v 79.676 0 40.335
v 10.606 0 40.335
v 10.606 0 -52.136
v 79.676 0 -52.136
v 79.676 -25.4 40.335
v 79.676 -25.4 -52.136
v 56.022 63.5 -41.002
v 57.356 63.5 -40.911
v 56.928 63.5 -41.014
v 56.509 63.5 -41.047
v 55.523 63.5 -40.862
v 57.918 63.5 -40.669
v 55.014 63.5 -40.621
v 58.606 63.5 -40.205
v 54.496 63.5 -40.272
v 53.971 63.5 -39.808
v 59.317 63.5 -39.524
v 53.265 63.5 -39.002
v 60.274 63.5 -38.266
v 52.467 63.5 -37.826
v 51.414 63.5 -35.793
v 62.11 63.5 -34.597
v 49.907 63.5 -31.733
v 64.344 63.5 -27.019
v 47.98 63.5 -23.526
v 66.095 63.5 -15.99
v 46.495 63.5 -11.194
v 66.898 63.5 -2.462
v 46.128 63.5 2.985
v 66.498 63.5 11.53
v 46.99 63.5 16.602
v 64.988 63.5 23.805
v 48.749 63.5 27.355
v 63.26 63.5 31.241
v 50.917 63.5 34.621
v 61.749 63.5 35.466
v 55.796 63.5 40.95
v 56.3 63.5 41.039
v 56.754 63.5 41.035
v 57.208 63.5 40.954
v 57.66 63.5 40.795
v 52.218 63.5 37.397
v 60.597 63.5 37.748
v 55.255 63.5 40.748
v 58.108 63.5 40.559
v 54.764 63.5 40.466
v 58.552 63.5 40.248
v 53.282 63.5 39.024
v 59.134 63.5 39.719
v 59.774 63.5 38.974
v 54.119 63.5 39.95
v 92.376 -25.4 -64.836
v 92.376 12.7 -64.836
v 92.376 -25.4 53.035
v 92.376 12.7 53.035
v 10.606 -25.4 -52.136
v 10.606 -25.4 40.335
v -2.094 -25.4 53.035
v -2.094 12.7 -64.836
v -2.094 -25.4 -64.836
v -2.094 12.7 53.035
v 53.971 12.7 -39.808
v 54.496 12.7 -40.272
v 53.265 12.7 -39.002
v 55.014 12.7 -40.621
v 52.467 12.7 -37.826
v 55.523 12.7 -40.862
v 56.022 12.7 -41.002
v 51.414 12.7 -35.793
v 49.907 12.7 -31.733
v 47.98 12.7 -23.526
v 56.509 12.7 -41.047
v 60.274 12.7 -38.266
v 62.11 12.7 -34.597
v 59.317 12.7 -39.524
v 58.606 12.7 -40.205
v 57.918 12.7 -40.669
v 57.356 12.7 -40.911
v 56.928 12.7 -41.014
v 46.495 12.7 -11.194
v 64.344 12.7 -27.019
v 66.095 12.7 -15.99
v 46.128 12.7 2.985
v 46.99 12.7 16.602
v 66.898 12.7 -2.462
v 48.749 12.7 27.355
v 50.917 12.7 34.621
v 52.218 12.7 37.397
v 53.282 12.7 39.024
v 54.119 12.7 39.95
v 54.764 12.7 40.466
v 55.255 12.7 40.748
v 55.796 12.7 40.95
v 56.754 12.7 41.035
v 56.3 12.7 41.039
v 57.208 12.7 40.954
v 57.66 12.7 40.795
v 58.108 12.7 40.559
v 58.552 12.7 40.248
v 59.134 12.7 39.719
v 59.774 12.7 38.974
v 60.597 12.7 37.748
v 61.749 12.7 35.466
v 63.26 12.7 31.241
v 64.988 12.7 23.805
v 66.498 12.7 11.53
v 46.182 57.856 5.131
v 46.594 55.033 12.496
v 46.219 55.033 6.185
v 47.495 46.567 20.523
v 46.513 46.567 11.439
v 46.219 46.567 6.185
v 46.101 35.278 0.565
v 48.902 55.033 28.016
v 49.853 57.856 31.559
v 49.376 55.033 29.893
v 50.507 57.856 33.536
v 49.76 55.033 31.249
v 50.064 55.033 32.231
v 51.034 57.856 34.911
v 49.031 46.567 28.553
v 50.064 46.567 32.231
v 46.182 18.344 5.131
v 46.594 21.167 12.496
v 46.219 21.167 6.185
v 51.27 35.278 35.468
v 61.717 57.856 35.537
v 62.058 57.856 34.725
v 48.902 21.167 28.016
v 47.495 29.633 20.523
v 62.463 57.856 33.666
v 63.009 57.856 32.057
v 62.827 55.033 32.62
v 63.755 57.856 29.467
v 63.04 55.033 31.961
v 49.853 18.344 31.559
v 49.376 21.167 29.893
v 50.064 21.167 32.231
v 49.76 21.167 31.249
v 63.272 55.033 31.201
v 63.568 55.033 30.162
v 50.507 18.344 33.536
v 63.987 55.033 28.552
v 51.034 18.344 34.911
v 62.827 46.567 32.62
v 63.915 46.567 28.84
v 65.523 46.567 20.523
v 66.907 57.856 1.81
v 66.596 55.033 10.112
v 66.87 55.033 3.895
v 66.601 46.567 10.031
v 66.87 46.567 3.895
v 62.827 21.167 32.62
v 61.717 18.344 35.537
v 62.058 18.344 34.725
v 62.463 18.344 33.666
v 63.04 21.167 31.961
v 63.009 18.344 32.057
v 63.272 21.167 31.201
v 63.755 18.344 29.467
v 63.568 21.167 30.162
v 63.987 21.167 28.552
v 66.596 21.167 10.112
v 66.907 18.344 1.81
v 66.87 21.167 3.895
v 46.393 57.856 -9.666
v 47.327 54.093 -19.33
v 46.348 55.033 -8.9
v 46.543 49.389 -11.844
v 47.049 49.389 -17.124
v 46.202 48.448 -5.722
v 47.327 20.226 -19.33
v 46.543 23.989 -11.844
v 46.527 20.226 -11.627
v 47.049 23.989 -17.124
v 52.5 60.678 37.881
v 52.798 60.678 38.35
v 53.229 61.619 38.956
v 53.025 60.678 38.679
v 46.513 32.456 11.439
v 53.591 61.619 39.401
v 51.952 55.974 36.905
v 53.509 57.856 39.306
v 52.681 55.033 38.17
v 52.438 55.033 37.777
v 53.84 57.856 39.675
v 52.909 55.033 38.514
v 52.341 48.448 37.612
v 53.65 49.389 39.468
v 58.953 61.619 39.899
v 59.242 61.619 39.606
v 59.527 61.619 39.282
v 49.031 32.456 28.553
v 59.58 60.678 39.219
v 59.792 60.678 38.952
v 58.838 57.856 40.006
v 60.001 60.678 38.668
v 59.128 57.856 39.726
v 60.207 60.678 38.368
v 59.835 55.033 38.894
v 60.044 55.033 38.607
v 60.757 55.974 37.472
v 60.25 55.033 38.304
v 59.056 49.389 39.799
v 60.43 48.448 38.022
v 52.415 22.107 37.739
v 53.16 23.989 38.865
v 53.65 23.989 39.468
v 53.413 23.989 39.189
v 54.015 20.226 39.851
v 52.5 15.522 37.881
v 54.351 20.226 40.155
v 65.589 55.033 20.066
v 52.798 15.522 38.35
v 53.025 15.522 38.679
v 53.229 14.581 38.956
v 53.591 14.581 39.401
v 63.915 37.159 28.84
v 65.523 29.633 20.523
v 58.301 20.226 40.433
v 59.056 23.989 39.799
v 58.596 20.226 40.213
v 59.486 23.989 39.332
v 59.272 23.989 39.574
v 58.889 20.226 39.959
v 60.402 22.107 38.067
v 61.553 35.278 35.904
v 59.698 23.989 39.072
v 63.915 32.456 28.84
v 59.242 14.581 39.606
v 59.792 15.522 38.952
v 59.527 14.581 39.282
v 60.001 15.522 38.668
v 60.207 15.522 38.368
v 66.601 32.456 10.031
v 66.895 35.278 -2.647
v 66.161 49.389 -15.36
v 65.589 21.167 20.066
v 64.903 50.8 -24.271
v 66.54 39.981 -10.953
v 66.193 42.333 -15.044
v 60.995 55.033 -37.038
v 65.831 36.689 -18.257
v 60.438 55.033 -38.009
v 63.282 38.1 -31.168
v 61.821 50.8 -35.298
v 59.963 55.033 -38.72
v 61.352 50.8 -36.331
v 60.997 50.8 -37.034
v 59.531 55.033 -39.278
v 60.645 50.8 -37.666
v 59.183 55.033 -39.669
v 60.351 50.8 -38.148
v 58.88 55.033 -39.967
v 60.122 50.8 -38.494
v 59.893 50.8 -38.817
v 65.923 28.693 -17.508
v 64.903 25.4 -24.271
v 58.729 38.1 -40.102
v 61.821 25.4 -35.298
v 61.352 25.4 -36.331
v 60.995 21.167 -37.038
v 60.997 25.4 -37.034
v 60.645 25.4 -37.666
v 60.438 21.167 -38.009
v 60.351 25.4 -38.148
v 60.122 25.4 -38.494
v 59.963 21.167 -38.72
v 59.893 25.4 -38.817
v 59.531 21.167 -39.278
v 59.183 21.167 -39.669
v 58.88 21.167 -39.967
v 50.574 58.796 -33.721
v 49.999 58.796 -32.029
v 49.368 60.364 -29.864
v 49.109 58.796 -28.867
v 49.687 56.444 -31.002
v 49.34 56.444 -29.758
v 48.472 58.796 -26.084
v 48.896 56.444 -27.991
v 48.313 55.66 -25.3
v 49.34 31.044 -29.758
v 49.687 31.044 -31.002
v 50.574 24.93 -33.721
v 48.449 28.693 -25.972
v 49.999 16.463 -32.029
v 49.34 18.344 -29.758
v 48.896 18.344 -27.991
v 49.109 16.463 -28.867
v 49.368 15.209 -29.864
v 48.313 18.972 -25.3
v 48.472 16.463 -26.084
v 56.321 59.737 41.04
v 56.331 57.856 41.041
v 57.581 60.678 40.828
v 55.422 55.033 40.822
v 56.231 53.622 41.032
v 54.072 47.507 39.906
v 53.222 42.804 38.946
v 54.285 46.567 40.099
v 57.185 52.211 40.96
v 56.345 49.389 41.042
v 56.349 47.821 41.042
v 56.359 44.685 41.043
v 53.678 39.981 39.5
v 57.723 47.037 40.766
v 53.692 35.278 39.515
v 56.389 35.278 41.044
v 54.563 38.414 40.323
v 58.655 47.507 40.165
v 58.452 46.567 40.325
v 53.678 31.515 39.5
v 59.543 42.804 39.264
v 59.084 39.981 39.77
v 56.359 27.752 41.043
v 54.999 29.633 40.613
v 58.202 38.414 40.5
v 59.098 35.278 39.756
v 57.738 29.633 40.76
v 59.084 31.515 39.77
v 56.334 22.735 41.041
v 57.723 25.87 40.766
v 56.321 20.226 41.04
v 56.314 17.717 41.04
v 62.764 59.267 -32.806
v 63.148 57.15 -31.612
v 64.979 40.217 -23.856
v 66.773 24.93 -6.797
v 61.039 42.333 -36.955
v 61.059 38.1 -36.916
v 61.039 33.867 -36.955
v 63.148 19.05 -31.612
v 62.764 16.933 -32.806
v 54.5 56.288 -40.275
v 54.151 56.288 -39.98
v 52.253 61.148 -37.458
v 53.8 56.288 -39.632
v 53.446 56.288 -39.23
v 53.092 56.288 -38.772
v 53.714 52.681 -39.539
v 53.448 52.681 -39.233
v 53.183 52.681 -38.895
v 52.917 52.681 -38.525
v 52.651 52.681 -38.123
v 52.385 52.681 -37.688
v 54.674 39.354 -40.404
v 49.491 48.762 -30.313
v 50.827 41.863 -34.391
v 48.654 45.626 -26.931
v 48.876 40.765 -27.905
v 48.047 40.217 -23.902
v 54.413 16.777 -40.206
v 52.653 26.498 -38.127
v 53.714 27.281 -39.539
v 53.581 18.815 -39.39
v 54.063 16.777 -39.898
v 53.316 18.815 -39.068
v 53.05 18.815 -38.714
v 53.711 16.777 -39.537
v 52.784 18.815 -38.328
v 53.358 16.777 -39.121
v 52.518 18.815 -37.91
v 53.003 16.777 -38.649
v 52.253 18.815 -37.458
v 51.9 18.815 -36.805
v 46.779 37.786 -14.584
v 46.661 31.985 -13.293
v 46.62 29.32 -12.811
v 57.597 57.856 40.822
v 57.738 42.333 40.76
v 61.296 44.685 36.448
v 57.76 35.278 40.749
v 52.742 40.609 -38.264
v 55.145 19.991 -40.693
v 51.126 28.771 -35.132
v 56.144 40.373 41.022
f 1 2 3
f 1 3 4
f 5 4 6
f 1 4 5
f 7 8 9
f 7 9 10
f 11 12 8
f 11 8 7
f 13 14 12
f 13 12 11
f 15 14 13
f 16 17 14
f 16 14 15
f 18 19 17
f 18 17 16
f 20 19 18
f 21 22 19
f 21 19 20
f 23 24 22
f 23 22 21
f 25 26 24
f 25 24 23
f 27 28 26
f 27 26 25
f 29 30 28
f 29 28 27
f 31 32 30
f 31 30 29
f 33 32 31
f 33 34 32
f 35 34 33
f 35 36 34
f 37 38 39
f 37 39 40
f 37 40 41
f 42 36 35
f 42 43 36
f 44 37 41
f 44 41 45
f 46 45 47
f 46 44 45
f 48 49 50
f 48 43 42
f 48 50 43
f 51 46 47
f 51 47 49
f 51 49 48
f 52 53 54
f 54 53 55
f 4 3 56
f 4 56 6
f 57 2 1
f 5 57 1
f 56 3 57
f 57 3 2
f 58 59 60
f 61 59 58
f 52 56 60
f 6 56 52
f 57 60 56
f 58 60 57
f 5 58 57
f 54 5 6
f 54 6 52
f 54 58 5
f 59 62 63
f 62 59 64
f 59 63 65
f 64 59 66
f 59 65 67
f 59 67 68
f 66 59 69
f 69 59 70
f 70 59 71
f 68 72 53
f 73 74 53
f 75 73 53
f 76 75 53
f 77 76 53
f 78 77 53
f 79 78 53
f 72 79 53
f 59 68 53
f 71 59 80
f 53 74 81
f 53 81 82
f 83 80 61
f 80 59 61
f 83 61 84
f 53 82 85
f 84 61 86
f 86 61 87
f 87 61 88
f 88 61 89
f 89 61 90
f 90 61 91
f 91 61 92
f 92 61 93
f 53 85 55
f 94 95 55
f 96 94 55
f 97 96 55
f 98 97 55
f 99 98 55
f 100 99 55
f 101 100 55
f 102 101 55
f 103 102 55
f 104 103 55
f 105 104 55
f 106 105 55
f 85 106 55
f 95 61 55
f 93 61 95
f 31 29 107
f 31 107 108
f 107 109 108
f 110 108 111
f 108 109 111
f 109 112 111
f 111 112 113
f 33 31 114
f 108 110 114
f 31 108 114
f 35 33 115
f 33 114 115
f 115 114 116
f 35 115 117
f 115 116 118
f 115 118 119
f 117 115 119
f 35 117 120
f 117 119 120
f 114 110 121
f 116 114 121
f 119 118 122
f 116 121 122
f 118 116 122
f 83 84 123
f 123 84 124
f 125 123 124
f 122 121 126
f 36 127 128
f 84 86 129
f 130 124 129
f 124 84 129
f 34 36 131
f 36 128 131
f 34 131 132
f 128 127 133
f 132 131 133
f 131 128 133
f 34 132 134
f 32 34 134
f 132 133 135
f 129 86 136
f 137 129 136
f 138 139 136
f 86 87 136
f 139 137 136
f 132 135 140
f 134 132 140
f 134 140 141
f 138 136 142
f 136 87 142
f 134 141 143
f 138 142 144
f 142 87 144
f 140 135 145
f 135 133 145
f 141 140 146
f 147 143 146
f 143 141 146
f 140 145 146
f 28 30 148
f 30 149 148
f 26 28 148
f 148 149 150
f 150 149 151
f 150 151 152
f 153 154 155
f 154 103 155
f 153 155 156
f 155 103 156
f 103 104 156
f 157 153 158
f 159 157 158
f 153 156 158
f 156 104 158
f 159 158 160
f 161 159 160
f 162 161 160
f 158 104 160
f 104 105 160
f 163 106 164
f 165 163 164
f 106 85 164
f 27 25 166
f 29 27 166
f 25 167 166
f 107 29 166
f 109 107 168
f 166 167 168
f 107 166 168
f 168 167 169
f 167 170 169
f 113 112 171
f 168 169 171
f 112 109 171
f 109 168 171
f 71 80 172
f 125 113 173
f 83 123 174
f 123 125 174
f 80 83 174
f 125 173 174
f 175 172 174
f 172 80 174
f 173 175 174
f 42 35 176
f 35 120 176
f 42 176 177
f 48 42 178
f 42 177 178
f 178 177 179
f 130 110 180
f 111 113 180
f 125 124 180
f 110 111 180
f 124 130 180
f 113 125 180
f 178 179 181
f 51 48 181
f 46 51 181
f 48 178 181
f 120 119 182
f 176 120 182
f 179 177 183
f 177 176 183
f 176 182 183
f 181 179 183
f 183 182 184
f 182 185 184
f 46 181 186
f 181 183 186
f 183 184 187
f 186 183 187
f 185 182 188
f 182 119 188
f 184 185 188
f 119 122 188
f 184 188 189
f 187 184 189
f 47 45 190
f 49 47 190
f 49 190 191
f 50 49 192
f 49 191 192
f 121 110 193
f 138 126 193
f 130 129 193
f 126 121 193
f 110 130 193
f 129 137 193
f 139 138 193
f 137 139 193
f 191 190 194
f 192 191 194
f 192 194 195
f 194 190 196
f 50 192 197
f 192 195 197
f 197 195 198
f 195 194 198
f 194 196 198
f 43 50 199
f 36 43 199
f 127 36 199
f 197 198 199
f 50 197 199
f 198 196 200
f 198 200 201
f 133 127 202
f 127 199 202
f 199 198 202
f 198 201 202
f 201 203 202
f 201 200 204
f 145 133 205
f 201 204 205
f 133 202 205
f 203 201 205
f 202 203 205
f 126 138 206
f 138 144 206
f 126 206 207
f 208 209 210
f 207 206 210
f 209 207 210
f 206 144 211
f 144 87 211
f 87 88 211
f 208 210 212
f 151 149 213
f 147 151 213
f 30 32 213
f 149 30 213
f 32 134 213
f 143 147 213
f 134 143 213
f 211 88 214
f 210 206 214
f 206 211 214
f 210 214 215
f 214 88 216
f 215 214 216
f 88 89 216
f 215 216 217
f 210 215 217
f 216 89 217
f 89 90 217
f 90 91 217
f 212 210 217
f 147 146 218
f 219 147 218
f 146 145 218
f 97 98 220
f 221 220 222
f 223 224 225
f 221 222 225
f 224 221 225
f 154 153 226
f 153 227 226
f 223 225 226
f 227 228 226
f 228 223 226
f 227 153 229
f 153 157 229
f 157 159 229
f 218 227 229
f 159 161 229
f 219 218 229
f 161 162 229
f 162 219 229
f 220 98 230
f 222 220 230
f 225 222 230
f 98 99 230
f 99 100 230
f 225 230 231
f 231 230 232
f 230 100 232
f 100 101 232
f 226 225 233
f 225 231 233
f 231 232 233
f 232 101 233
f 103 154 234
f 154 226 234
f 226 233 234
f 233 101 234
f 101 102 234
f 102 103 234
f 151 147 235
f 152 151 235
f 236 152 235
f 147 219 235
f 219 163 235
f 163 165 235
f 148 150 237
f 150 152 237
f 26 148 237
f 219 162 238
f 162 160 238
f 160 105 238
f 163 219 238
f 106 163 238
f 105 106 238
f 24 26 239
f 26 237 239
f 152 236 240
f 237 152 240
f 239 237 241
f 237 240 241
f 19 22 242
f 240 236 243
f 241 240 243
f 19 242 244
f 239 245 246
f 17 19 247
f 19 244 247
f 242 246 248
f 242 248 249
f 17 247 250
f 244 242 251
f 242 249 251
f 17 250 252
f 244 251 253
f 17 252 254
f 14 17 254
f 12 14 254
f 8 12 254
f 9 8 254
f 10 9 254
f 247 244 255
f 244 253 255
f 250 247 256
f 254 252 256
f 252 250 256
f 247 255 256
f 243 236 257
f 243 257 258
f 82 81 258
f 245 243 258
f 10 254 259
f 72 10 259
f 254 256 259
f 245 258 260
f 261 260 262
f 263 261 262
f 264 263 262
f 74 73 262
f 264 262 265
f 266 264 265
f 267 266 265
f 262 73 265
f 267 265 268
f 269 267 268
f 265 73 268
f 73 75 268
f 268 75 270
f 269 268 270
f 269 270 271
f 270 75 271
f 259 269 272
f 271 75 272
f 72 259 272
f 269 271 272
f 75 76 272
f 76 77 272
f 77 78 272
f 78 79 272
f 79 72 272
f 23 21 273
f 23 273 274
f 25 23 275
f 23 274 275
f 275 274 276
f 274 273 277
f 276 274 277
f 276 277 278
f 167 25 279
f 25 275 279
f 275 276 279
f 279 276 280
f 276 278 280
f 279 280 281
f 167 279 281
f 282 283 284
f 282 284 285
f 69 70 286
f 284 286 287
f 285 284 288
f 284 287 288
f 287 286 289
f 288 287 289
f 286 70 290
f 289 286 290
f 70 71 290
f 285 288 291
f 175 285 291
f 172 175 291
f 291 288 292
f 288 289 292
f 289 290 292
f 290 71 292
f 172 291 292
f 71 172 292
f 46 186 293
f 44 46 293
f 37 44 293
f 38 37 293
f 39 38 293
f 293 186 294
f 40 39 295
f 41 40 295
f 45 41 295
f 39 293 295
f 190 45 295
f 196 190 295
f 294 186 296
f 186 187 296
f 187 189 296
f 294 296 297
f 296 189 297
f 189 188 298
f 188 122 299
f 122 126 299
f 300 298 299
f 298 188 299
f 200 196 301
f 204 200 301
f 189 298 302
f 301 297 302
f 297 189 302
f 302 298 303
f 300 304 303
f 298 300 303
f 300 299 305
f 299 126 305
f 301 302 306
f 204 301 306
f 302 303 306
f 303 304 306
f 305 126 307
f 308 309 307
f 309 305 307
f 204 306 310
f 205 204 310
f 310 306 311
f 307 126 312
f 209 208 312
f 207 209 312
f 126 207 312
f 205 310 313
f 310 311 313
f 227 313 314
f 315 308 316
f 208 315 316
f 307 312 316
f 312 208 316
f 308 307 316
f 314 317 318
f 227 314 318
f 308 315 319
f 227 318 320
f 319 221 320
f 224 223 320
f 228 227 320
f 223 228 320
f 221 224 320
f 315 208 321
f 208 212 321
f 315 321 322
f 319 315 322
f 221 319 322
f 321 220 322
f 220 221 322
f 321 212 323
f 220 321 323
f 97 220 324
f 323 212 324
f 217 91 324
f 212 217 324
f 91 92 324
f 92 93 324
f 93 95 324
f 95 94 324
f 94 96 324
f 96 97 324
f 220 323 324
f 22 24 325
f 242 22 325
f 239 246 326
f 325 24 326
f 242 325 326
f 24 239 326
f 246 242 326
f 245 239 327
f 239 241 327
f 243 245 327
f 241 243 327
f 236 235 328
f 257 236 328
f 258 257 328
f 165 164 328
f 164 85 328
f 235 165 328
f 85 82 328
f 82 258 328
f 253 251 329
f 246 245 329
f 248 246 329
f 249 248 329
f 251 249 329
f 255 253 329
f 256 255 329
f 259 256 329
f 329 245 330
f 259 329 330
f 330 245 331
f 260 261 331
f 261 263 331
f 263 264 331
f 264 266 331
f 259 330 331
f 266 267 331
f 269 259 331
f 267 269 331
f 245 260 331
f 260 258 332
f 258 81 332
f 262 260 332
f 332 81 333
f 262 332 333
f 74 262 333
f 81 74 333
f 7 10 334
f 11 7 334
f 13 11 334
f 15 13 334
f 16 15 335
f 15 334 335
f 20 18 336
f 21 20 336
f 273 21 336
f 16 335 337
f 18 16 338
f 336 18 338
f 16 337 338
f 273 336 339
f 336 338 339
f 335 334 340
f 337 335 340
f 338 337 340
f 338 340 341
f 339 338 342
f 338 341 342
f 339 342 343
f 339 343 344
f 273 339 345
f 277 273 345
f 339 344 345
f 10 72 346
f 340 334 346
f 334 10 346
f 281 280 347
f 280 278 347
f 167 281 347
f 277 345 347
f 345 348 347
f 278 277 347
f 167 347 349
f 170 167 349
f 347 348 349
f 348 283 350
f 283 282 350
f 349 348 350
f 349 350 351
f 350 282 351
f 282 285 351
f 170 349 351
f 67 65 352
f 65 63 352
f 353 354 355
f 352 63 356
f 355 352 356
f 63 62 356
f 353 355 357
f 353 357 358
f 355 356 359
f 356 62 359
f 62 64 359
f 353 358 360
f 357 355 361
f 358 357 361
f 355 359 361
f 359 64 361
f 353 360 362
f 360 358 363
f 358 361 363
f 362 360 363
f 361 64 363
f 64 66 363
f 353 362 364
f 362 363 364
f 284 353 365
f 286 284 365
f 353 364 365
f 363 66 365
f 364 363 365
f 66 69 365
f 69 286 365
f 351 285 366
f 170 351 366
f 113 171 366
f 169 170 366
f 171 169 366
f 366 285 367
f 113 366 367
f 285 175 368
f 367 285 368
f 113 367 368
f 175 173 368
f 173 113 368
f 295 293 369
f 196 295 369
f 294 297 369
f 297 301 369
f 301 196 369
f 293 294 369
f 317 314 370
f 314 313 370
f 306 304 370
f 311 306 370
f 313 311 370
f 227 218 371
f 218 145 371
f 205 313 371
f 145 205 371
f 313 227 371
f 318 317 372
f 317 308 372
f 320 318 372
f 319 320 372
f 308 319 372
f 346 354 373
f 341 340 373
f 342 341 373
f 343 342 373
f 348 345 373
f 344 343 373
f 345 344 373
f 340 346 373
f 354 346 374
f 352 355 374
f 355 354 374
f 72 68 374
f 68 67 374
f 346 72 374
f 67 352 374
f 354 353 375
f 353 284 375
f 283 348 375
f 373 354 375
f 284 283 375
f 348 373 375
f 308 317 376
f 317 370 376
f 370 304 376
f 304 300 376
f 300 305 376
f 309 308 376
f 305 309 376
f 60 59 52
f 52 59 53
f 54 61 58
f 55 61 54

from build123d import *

# Parameters (mm, degrees)
F0_W     = 69.0704714507
F0_H     = 92.4708135426
F1_DEPTH = 25.4
F2_T     = 12.7
F5_DEPTH = 50.8


with BuildPart() as f1:
    # F0 (on Front) → F1 (new body)
    with BuildSketch(Plane.XZ):
        with Locations((45.1410496607, -5.9002693743)):
            Rectangle(F0_W, F0_H)
    extrude(amount=F1_DEPTH)

    # F2
    f2_openings = [f1.faces().sort_by_distance(p)[0] for p in [
        (45.14105, -25.4, -5.900269),
    ]]
    offset(amount=F2_T, openings=f2_openings, kind=Kind.INTERSECTION)

    # F4 (on face) → F5 (join)
    with BuildSketch(Plane(origin=(0, 12.7, 0), x_dir=(-1, 0, 0), z_dir=(0, 1, 0))):
        with BuildLine():
            add(Edge.make_bspline(
                [(-56.5086975694, -41.0468280315), (-38.4809391547, -41.0468280315), (-47.494818362, 20.5234140158), (-56.5086975694, 82.0936560631), (-65.5225767767, 20.5234140158), (-74.5364559841, -41.0468280315), (-56.5086975694, -41.0468280315)],
                knots=[0, 0, 0, 2.0943951024, 2.0943951024, 4.1887902048, 4.1887902048, 6.2831853072, 6.2831853072, 6.2831853072], degree=2, weights=[1, 0.5, 1, 0.5, 1, 0.5, 1]))
        make_face()
    extrude(amount=F5_DEPTH)


solid = f1.part
